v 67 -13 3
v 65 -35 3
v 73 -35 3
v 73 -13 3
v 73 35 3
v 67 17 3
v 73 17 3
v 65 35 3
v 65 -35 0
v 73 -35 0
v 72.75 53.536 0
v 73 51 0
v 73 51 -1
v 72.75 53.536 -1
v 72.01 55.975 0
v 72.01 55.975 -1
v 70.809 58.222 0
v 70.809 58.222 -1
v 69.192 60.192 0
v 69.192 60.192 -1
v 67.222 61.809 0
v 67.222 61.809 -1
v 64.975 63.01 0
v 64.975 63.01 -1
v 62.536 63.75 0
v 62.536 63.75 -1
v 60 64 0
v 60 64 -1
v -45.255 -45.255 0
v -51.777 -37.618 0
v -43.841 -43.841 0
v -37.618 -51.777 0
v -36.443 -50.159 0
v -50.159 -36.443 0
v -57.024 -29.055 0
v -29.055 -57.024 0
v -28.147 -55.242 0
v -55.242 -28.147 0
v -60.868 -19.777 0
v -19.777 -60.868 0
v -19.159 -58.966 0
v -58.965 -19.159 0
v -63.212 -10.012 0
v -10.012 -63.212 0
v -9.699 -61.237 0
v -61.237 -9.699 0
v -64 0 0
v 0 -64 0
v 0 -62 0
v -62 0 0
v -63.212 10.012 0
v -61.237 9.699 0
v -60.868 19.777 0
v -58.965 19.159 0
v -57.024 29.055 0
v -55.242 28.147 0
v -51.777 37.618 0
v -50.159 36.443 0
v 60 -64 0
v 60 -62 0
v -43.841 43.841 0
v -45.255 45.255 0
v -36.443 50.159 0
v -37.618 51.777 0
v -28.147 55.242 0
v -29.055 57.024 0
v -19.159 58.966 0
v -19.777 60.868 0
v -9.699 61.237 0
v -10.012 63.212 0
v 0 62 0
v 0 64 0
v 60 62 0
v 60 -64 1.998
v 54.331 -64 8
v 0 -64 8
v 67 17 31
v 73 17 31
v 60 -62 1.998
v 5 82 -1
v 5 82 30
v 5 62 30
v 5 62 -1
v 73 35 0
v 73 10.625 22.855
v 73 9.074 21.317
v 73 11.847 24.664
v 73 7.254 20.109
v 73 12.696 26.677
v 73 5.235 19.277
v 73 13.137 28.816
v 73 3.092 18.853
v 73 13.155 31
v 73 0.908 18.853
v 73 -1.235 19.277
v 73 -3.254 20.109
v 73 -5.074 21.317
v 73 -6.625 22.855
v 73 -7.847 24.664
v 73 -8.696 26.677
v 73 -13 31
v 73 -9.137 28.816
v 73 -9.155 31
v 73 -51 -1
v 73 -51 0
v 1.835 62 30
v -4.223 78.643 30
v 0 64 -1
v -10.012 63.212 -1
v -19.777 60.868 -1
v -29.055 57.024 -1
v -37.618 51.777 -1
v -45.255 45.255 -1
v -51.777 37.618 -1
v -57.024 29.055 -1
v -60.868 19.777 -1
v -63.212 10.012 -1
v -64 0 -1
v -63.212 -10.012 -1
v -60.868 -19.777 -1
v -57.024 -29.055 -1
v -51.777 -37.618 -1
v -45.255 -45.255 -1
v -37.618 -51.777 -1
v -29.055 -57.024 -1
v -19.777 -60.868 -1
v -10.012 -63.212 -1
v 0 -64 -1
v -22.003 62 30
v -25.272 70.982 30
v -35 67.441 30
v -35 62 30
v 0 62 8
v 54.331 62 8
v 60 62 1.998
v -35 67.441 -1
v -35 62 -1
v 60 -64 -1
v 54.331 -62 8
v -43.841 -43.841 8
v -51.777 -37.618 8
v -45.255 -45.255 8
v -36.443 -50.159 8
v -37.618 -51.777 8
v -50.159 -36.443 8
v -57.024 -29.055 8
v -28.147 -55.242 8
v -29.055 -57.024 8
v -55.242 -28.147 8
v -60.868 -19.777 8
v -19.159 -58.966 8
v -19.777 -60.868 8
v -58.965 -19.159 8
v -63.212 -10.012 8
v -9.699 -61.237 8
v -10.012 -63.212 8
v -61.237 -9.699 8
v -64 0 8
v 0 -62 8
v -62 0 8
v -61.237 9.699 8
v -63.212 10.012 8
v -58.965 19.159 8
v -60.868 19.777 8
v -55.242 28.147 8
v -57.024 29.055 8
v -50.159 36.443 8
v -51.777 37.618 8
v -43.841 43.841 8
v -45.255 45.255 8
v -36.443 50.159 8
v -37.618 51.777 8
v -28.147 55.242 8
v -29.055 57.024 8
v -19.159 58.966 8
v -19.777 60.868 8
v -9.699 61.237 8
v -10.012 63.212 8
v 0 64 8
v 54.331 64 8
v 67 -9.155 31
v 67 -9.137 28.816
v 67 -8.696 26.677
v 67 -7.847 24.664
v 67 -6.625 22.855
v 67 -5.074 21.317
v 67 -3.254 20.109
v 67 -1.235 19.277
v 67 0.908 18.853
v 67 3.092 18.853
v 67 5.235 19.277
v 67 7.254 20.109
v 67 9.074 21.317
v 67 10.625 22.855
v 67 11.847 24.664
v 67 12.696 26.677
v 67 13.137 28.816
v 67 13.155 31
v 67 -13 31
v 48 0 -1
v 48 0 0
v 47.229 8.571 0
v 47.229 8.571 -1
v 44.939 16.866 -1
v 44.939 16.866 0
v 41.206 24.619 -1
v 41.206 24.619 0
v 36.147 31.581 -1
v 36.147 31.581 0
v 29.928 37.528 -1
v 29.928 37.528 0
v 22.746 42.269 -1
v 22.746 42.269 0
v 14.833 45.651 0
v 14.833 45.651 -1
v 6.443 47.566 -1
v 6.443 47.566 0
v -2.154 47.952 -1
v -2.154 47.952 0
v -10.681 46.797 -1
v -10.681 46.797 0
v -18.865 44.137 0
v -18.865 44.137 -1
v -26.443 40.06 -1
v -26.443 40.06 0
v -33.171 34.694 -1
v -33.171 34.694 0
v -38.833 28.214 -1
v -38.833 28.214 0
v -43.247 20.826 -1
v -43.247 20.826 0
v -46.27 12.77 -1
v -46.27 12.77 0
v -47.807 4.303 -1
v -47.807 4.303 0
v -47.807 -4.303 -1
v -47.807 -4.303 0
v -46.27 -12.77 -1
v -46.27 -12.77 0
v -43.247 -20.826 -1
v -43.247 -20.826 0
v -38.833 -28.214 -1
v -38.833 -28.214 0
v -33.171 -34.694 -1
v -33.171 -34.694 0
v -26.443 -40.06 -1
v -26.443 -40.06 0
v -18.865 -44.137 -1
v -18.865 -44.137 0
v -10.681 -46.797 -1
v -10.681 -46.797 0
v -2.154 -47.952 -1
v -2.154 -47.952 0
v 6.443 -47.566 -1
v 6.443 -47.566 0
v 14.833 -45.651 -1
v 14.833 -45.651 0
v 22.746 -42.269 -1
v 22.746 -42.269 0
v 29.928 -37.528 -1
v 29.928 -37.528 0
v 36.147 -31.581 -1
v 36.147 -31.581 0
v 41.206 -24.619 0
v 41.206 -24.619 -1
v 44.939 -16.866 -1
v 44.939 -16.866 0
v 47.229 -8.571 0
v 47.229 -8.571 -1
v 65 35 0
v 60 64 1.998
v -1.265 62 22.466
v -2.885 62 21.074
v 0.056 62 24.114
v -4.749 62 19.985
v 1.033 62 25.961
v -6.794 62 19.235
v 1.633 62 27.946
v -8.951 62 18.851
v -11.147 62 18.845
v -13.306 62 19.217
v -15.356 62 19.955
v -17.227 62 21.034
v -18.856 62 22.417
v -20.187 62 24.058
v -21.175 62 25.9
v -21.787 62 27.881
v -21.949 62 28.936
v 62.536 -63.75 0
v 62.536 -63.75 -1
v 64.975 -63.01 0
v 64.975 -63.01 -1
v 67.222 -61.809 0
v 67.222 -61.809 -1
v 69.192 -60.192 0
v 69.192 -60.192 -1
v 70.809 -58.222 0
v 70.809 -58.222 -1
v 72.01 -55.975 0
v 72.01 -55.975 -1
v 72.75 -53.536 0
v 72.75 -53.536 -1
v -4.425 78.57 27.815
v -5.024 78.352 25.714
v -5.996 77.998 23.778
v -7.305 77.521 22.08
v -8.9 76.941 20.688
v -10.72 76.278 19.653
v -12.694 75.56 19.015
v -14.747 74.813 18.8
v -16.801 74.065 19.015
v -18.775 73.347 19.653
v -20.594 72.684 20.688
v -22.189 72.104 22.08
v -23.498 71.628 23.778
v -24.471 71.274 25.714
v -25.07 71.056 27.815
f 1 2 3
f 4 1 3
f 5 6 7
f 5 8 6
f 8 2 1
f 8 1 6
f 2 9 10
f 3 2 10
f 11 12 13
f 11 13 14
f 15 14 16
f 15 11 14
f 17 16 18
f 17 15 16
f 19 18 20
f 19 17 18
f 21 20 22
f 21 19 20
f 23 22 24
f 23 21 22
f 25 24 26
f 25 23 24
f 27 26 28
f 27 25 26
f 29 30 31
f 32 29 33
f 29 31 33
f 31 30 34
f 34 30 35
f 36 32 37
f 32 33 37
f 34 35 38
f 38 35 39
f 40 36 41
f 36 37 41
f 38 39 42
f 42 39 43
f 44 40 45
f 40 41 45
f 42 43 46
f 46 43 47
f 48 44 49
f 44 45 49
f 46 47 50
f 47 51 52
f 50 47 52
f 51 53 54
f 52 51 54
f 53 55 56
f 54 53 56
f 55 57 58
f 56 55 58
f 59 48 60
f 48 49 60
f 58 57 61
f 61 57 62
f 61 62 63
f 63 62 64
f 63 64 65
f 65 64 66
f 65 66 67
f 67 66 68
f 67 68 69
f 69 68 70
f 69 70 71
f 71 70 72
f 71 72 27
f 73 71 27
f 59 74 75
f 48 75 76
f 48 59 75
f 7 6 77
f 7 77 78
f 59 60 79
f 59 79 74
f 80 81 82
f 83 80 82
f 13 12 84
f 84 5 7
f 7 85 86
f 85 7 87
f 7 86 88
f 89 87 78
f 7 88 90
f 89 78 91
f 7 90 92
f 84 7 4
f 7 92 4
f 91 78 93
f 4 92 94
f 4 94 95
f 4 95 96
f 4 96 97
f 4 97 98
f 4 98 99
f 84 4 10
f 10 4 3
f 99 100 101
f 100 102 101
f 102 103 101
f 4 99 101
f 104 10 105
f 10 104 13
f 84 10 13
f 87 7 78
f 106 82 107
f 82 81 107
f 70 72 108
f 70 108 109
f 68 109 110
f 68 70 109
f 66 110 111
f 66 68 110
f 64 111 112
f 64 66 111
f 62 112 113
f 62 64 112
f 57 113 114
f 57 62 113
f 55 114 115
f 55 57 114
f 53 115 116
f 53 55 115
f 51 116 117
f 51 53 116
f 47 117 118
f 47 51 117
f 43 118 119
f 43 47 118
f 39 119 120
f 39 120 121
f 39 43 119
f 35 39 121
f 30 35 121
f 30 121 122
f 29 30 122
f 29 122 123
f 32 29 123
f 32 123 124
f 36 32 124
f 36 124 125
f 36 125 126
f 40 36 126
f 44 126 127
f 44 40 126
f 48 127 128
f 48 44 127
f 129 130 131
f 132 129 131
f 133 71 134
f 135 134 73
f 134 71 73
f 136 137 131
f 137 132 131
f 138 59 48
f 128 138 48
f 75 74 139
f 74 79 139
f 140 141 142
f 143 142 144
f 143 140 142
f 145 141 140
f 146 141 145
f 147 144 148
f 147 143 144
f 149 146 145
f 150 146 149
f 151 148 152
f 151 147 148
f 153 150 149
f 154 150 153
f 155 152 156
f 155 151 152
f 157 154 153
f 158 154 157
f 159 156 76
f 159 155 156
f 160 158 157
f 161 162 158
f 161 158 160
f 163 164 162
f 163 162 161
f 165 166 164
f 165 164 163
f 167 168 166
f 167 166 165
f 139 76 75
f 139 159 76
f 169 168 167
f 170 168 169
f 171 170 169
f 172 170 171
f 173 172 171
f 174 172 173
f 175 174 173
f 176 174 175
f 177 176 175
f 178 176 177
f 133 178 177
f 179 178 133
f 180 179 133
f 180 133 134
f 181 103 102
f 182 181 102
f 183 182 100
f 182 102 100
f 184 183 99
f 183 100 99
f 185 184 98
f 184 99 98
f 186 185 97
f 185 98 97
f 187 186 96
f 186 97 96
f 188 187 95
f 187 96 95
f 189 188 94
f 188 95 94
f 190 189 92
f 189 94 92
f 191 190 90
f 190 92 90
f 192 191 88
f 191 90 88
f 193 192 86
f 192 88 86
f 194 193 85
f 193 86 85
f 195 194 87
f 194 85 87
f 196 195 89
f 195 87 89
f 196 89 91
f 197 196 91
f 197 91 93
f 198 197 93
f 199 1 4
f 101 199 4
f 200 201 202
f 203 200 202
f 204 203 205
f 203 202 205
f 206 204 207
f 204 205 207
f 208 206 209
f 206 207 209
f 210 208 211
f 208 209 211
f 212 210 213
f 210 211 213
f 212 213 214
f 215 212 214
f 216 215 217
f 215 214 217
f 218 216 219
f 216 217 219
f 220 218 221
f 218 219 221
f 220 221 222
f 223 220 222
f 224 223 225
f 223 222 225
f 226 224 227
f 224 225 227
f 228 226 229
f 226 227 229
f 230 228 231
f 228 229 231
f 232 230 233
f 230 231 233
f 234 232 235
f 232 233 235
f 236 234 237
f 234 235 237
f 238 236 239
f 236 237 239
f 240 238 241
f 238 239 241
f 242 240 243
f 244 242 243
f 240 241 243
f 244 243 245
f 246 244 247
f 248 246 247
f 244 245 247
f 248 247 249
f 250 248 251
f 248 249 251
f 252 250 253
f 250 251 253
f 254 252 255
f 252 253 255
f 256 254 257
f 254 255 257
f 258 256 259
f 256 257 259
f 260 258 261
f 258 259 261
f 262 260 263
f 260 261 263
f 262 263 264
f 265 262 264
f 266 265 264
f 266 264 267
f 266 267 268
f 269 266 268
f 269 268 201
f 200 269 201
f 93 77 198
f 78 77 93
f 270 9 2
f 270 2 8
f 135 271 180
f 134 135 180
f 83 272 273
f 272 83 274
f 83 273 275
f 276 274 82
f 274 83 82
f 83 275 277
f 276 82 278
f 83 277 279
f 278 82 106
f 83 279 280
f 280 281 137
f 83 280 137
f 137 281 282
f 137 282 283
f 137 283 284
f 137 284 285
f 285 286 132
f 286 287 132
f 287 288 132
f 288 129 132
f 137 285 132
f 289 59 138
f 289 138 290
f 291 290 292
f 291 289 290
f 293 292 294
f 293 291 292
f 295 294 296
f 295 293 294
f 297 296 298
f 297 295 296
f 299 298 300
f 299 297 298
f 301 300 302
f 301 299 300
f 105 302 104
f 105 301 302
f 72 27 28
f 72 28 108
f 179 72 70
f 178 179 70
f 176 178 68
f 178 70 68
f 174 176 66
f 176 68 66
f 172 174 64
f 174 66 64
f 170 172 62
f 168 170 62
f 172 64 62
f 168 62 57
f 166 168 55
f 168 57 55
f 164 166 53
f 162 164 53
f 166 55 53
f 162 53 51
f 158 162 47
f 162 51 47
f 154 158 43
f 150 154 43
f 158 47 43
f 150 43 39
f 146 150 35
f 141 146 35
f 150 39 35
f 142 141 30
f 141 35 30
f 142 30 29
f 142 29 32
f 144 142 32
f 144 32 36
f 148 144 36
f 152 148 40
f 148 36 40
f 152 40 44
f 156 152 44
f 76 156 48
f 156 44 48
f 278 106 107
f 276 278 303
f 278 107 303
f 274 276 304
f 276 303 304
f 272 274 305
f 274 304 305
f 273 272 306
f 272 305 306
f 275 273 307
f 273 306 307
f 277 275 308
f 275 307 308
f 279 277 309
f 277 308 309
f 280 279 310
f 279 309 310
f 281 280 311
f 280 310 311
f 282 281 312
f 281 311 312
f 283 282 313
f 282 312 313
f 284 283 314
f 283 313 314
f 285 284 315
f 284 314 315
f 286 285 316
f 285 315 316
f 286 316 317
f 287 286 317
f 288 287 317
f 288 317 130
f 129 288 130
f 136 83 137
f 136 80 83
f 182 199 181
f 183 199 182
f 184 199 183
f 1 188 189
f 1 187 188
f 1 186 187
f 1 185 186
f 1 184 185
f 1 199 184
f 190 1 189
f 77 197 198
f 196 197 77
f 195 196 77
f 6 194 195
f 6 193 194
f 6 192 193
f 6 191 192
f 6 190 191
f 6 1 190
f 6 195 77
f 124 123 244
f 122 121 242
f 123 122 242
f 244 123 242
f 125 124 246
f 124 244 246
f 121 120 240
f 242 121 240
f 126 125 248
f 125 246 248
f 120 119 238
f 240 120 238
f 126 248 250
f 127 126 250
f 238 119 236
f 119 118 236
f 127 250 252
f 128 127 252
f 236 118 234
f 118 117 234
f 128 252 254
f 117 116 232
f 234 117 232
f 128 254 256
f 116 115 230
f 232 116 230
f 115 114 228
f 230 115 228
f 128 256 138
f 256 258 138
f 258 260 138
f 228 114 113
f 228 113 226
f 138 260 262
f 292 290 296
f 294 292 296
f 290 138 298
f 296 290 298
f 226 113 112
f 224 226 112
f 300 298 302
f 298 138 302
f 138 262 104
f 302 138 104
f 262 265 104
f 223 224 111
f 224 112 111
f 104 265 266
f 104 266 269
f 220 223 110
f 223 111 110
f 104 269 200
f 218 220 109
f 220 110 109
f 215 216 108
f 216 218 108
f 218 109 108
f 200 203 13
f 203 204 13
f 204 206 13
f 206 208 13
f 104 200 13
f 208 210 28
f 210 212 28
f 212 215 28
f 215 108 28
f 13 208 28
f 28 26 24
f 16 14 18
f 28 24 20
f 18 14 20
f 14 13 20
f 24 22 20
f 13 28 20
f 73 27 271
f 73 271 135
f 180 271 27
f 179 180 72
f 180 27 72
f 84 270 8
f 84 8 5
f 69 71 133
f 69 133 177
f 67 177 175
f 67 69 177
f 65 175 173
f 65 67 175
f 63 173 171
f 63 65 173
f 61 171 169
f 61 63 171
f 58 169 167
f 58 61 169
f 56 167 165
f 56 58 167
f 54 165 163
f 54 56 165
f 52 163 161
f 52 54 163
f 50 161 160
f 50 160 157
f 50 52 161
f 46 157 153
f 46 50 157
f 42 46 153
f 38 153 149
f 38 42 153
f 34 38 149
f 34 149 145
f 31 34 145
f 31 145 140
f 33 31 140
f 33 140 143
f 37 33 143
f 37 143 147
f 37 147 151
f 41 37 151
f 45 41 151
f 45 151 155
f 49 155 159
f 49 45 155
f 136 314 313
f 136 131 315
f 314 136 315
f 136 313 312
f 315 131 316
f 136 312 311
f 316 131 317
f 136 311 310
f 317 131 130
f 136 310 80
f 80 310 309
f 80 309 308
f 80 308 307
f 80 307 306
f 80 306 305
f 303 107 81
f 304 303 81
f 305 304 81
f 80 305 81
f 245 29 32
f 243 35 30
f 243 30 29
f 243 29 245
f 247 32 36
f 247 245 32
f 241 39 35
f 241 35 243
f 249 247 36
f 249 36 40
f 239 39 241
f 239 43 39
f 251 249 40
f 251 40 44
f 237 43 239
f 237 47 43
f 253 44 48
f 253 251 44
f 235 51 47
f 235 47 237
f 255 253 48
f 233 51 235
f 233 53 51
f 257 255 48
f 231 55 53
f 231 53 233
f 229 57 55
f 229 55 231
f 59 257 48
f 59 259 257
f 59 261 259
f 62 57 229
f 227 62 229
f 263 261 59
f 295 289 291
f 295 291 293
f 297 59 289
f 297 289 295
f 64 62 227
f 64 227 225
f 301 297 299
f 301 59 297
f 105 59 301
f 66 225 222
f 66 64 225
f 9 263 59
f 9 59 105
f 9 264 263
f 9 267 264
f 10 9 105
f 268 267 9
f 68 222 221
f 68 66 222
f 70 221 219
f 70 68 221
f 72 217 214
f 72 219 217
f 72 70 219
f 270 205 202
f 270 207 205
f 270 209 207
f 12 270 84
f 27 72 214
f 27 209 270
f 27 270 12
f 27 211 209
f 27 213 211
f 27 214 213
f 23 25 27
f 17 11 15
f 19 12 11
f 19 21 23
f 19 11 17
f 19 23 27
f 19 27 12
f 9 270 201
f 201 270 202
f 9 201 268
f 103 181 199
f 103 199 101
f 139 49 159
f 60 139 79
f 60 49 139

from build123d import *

# Parameters (mm, degrees)
SKETCH001_R       = 48
PAD_DEPTH         = 1
SKETCH_W          = 8
SKETCH_H          = 70
PAD003_DEPTH      = 3
SKETCH008_W       = 6
SKETCH008_H       = 30
PAD004_DEPTH      = 28
SKETCH009_R       = 11.2
POCKET003_DEPTH   = 137.0009589023
PAD001_DEPTH      = 8
POCKET005_DEPTH   = 128.0010000001
PAD002_DEPTH      = 30
PAD002_DEPTH_BACK = 1
SKETCH012_R       = 11.2
POCKET_DEPTH      = 18.7948524157


with BuildPart() as synctubehole:
    # Sketch001 → Pad (new body)
    with BuildSketch(Plane.XY):
        with BuildLine():
            Line((60, 64), (0, 64))
            ThreePointArc((0, 64), (-63.9999589023, 0), (0, -64))
            Line((60, -64), (0, -64))
            ThreePointArc((60, -64), (69.1923881554, -60.1923881554), (73, -51))
            Line((73, 51), (73, -51))
            ThreePointArc((73, 51), (69.1923881554, 60.1923881554), (60, 64))
        make_face()
        Circle(SKETCH001_R, mode=Mode.SUBTRACT)
    extrude(amount=-PAD_DEPTH)

    # Sketch → Pad003 (new body)
    with BuildSketch(Plane.XY):
        with Locations((69, 0)):
            Rectangle(SKETCH_W, SKETCH_H)
    extrude(amount=PAD003_DEPTH)

    # Sketch008 → Pad004 (new body)
    with BuildSketch(Plane.XY.offset(3)):
        with Locations((70, 2)):
            Rectangle(SKETCH008_W, SKETCH008_H)
    extrude(amount=PAD004_DEPTH)

    # Sketch009 → Pocket003 (cut, through all)
    with BuildSketch(Plane.YZ.offset(73)):
        with Locations((2, 30)):
            Circle(SKETCH009_R)
    extrude(amount=-POCKET003_DEPTH, mode=Mode.SUBTRACT)


with BuildPart() as fillet_connector:
    # Sketch002 → Pad001 (new body)
    with BuildSketch(Plane.XY):
        with BuildLine():
            Line((60, 64), (0, 64))
            ThreePointArc((0, 64), (-63.9999355288, 0), (0, -64))
            Line((60, -64), (0, -64))
            Line((60, -62), (60, -64))
            Line((0, -62), (60, -62))
            ThreePointArc((0, 62), (-61.9999854046, 0), (0, -62))
            Line((0, 62), (60, 62))
            Line((60, 64), (60, 62))
        make_face()
    extrude(amount=PAD001_DEPTH)

    # Sketch011 → Pocket005 (cut, through all)
    with BuildSketch(Plane(origin=(0, 64, 0), x_dir=(-1, 0, 0), z_dir=(0, 1, 0))):
        Polygon((-53.9525, 8.40024), (-64.2022626889, 10.8364072587), (-61.1871640783, 0.741768758), align=None)
    extrude(amount=-POCKET005_DEPTH, mode=Mode.SUBTRACT)


with BuildPart() as stpocket:
    # Sketch004 → Pad002 (new body, two sides)
    with BuildSketch(Plane.XY) as pad002_sk:
        Polygon((5, 62), (-35, 62), (-35, 67.4411906293), (5, 82), align=None)
    extrude(amount=PAD002_DEPTH)
    extrude(pad002_sk.sketch, amount=-PAD002_DEPTH_BACK)

    # Sketch012 → Pocket (cut, through all)
    with BuildSketch(Plane(origin=(-25.769403105, 70.8008531437, 0), x_dir=(-0.9396926208, -0.3420201433, 0), z_dir=(-0.3420201433, 0.9396926208, 0))):
        with Locations((-11.7294429294, 30)):
            Circle(SKETCH012_R)
    extrude(amount=-POCKET_DEPTH, mode=Mode.SUBTRACT)


solid = Compound([synctubehole.part, fillet_connector.part, stpocket.part])
